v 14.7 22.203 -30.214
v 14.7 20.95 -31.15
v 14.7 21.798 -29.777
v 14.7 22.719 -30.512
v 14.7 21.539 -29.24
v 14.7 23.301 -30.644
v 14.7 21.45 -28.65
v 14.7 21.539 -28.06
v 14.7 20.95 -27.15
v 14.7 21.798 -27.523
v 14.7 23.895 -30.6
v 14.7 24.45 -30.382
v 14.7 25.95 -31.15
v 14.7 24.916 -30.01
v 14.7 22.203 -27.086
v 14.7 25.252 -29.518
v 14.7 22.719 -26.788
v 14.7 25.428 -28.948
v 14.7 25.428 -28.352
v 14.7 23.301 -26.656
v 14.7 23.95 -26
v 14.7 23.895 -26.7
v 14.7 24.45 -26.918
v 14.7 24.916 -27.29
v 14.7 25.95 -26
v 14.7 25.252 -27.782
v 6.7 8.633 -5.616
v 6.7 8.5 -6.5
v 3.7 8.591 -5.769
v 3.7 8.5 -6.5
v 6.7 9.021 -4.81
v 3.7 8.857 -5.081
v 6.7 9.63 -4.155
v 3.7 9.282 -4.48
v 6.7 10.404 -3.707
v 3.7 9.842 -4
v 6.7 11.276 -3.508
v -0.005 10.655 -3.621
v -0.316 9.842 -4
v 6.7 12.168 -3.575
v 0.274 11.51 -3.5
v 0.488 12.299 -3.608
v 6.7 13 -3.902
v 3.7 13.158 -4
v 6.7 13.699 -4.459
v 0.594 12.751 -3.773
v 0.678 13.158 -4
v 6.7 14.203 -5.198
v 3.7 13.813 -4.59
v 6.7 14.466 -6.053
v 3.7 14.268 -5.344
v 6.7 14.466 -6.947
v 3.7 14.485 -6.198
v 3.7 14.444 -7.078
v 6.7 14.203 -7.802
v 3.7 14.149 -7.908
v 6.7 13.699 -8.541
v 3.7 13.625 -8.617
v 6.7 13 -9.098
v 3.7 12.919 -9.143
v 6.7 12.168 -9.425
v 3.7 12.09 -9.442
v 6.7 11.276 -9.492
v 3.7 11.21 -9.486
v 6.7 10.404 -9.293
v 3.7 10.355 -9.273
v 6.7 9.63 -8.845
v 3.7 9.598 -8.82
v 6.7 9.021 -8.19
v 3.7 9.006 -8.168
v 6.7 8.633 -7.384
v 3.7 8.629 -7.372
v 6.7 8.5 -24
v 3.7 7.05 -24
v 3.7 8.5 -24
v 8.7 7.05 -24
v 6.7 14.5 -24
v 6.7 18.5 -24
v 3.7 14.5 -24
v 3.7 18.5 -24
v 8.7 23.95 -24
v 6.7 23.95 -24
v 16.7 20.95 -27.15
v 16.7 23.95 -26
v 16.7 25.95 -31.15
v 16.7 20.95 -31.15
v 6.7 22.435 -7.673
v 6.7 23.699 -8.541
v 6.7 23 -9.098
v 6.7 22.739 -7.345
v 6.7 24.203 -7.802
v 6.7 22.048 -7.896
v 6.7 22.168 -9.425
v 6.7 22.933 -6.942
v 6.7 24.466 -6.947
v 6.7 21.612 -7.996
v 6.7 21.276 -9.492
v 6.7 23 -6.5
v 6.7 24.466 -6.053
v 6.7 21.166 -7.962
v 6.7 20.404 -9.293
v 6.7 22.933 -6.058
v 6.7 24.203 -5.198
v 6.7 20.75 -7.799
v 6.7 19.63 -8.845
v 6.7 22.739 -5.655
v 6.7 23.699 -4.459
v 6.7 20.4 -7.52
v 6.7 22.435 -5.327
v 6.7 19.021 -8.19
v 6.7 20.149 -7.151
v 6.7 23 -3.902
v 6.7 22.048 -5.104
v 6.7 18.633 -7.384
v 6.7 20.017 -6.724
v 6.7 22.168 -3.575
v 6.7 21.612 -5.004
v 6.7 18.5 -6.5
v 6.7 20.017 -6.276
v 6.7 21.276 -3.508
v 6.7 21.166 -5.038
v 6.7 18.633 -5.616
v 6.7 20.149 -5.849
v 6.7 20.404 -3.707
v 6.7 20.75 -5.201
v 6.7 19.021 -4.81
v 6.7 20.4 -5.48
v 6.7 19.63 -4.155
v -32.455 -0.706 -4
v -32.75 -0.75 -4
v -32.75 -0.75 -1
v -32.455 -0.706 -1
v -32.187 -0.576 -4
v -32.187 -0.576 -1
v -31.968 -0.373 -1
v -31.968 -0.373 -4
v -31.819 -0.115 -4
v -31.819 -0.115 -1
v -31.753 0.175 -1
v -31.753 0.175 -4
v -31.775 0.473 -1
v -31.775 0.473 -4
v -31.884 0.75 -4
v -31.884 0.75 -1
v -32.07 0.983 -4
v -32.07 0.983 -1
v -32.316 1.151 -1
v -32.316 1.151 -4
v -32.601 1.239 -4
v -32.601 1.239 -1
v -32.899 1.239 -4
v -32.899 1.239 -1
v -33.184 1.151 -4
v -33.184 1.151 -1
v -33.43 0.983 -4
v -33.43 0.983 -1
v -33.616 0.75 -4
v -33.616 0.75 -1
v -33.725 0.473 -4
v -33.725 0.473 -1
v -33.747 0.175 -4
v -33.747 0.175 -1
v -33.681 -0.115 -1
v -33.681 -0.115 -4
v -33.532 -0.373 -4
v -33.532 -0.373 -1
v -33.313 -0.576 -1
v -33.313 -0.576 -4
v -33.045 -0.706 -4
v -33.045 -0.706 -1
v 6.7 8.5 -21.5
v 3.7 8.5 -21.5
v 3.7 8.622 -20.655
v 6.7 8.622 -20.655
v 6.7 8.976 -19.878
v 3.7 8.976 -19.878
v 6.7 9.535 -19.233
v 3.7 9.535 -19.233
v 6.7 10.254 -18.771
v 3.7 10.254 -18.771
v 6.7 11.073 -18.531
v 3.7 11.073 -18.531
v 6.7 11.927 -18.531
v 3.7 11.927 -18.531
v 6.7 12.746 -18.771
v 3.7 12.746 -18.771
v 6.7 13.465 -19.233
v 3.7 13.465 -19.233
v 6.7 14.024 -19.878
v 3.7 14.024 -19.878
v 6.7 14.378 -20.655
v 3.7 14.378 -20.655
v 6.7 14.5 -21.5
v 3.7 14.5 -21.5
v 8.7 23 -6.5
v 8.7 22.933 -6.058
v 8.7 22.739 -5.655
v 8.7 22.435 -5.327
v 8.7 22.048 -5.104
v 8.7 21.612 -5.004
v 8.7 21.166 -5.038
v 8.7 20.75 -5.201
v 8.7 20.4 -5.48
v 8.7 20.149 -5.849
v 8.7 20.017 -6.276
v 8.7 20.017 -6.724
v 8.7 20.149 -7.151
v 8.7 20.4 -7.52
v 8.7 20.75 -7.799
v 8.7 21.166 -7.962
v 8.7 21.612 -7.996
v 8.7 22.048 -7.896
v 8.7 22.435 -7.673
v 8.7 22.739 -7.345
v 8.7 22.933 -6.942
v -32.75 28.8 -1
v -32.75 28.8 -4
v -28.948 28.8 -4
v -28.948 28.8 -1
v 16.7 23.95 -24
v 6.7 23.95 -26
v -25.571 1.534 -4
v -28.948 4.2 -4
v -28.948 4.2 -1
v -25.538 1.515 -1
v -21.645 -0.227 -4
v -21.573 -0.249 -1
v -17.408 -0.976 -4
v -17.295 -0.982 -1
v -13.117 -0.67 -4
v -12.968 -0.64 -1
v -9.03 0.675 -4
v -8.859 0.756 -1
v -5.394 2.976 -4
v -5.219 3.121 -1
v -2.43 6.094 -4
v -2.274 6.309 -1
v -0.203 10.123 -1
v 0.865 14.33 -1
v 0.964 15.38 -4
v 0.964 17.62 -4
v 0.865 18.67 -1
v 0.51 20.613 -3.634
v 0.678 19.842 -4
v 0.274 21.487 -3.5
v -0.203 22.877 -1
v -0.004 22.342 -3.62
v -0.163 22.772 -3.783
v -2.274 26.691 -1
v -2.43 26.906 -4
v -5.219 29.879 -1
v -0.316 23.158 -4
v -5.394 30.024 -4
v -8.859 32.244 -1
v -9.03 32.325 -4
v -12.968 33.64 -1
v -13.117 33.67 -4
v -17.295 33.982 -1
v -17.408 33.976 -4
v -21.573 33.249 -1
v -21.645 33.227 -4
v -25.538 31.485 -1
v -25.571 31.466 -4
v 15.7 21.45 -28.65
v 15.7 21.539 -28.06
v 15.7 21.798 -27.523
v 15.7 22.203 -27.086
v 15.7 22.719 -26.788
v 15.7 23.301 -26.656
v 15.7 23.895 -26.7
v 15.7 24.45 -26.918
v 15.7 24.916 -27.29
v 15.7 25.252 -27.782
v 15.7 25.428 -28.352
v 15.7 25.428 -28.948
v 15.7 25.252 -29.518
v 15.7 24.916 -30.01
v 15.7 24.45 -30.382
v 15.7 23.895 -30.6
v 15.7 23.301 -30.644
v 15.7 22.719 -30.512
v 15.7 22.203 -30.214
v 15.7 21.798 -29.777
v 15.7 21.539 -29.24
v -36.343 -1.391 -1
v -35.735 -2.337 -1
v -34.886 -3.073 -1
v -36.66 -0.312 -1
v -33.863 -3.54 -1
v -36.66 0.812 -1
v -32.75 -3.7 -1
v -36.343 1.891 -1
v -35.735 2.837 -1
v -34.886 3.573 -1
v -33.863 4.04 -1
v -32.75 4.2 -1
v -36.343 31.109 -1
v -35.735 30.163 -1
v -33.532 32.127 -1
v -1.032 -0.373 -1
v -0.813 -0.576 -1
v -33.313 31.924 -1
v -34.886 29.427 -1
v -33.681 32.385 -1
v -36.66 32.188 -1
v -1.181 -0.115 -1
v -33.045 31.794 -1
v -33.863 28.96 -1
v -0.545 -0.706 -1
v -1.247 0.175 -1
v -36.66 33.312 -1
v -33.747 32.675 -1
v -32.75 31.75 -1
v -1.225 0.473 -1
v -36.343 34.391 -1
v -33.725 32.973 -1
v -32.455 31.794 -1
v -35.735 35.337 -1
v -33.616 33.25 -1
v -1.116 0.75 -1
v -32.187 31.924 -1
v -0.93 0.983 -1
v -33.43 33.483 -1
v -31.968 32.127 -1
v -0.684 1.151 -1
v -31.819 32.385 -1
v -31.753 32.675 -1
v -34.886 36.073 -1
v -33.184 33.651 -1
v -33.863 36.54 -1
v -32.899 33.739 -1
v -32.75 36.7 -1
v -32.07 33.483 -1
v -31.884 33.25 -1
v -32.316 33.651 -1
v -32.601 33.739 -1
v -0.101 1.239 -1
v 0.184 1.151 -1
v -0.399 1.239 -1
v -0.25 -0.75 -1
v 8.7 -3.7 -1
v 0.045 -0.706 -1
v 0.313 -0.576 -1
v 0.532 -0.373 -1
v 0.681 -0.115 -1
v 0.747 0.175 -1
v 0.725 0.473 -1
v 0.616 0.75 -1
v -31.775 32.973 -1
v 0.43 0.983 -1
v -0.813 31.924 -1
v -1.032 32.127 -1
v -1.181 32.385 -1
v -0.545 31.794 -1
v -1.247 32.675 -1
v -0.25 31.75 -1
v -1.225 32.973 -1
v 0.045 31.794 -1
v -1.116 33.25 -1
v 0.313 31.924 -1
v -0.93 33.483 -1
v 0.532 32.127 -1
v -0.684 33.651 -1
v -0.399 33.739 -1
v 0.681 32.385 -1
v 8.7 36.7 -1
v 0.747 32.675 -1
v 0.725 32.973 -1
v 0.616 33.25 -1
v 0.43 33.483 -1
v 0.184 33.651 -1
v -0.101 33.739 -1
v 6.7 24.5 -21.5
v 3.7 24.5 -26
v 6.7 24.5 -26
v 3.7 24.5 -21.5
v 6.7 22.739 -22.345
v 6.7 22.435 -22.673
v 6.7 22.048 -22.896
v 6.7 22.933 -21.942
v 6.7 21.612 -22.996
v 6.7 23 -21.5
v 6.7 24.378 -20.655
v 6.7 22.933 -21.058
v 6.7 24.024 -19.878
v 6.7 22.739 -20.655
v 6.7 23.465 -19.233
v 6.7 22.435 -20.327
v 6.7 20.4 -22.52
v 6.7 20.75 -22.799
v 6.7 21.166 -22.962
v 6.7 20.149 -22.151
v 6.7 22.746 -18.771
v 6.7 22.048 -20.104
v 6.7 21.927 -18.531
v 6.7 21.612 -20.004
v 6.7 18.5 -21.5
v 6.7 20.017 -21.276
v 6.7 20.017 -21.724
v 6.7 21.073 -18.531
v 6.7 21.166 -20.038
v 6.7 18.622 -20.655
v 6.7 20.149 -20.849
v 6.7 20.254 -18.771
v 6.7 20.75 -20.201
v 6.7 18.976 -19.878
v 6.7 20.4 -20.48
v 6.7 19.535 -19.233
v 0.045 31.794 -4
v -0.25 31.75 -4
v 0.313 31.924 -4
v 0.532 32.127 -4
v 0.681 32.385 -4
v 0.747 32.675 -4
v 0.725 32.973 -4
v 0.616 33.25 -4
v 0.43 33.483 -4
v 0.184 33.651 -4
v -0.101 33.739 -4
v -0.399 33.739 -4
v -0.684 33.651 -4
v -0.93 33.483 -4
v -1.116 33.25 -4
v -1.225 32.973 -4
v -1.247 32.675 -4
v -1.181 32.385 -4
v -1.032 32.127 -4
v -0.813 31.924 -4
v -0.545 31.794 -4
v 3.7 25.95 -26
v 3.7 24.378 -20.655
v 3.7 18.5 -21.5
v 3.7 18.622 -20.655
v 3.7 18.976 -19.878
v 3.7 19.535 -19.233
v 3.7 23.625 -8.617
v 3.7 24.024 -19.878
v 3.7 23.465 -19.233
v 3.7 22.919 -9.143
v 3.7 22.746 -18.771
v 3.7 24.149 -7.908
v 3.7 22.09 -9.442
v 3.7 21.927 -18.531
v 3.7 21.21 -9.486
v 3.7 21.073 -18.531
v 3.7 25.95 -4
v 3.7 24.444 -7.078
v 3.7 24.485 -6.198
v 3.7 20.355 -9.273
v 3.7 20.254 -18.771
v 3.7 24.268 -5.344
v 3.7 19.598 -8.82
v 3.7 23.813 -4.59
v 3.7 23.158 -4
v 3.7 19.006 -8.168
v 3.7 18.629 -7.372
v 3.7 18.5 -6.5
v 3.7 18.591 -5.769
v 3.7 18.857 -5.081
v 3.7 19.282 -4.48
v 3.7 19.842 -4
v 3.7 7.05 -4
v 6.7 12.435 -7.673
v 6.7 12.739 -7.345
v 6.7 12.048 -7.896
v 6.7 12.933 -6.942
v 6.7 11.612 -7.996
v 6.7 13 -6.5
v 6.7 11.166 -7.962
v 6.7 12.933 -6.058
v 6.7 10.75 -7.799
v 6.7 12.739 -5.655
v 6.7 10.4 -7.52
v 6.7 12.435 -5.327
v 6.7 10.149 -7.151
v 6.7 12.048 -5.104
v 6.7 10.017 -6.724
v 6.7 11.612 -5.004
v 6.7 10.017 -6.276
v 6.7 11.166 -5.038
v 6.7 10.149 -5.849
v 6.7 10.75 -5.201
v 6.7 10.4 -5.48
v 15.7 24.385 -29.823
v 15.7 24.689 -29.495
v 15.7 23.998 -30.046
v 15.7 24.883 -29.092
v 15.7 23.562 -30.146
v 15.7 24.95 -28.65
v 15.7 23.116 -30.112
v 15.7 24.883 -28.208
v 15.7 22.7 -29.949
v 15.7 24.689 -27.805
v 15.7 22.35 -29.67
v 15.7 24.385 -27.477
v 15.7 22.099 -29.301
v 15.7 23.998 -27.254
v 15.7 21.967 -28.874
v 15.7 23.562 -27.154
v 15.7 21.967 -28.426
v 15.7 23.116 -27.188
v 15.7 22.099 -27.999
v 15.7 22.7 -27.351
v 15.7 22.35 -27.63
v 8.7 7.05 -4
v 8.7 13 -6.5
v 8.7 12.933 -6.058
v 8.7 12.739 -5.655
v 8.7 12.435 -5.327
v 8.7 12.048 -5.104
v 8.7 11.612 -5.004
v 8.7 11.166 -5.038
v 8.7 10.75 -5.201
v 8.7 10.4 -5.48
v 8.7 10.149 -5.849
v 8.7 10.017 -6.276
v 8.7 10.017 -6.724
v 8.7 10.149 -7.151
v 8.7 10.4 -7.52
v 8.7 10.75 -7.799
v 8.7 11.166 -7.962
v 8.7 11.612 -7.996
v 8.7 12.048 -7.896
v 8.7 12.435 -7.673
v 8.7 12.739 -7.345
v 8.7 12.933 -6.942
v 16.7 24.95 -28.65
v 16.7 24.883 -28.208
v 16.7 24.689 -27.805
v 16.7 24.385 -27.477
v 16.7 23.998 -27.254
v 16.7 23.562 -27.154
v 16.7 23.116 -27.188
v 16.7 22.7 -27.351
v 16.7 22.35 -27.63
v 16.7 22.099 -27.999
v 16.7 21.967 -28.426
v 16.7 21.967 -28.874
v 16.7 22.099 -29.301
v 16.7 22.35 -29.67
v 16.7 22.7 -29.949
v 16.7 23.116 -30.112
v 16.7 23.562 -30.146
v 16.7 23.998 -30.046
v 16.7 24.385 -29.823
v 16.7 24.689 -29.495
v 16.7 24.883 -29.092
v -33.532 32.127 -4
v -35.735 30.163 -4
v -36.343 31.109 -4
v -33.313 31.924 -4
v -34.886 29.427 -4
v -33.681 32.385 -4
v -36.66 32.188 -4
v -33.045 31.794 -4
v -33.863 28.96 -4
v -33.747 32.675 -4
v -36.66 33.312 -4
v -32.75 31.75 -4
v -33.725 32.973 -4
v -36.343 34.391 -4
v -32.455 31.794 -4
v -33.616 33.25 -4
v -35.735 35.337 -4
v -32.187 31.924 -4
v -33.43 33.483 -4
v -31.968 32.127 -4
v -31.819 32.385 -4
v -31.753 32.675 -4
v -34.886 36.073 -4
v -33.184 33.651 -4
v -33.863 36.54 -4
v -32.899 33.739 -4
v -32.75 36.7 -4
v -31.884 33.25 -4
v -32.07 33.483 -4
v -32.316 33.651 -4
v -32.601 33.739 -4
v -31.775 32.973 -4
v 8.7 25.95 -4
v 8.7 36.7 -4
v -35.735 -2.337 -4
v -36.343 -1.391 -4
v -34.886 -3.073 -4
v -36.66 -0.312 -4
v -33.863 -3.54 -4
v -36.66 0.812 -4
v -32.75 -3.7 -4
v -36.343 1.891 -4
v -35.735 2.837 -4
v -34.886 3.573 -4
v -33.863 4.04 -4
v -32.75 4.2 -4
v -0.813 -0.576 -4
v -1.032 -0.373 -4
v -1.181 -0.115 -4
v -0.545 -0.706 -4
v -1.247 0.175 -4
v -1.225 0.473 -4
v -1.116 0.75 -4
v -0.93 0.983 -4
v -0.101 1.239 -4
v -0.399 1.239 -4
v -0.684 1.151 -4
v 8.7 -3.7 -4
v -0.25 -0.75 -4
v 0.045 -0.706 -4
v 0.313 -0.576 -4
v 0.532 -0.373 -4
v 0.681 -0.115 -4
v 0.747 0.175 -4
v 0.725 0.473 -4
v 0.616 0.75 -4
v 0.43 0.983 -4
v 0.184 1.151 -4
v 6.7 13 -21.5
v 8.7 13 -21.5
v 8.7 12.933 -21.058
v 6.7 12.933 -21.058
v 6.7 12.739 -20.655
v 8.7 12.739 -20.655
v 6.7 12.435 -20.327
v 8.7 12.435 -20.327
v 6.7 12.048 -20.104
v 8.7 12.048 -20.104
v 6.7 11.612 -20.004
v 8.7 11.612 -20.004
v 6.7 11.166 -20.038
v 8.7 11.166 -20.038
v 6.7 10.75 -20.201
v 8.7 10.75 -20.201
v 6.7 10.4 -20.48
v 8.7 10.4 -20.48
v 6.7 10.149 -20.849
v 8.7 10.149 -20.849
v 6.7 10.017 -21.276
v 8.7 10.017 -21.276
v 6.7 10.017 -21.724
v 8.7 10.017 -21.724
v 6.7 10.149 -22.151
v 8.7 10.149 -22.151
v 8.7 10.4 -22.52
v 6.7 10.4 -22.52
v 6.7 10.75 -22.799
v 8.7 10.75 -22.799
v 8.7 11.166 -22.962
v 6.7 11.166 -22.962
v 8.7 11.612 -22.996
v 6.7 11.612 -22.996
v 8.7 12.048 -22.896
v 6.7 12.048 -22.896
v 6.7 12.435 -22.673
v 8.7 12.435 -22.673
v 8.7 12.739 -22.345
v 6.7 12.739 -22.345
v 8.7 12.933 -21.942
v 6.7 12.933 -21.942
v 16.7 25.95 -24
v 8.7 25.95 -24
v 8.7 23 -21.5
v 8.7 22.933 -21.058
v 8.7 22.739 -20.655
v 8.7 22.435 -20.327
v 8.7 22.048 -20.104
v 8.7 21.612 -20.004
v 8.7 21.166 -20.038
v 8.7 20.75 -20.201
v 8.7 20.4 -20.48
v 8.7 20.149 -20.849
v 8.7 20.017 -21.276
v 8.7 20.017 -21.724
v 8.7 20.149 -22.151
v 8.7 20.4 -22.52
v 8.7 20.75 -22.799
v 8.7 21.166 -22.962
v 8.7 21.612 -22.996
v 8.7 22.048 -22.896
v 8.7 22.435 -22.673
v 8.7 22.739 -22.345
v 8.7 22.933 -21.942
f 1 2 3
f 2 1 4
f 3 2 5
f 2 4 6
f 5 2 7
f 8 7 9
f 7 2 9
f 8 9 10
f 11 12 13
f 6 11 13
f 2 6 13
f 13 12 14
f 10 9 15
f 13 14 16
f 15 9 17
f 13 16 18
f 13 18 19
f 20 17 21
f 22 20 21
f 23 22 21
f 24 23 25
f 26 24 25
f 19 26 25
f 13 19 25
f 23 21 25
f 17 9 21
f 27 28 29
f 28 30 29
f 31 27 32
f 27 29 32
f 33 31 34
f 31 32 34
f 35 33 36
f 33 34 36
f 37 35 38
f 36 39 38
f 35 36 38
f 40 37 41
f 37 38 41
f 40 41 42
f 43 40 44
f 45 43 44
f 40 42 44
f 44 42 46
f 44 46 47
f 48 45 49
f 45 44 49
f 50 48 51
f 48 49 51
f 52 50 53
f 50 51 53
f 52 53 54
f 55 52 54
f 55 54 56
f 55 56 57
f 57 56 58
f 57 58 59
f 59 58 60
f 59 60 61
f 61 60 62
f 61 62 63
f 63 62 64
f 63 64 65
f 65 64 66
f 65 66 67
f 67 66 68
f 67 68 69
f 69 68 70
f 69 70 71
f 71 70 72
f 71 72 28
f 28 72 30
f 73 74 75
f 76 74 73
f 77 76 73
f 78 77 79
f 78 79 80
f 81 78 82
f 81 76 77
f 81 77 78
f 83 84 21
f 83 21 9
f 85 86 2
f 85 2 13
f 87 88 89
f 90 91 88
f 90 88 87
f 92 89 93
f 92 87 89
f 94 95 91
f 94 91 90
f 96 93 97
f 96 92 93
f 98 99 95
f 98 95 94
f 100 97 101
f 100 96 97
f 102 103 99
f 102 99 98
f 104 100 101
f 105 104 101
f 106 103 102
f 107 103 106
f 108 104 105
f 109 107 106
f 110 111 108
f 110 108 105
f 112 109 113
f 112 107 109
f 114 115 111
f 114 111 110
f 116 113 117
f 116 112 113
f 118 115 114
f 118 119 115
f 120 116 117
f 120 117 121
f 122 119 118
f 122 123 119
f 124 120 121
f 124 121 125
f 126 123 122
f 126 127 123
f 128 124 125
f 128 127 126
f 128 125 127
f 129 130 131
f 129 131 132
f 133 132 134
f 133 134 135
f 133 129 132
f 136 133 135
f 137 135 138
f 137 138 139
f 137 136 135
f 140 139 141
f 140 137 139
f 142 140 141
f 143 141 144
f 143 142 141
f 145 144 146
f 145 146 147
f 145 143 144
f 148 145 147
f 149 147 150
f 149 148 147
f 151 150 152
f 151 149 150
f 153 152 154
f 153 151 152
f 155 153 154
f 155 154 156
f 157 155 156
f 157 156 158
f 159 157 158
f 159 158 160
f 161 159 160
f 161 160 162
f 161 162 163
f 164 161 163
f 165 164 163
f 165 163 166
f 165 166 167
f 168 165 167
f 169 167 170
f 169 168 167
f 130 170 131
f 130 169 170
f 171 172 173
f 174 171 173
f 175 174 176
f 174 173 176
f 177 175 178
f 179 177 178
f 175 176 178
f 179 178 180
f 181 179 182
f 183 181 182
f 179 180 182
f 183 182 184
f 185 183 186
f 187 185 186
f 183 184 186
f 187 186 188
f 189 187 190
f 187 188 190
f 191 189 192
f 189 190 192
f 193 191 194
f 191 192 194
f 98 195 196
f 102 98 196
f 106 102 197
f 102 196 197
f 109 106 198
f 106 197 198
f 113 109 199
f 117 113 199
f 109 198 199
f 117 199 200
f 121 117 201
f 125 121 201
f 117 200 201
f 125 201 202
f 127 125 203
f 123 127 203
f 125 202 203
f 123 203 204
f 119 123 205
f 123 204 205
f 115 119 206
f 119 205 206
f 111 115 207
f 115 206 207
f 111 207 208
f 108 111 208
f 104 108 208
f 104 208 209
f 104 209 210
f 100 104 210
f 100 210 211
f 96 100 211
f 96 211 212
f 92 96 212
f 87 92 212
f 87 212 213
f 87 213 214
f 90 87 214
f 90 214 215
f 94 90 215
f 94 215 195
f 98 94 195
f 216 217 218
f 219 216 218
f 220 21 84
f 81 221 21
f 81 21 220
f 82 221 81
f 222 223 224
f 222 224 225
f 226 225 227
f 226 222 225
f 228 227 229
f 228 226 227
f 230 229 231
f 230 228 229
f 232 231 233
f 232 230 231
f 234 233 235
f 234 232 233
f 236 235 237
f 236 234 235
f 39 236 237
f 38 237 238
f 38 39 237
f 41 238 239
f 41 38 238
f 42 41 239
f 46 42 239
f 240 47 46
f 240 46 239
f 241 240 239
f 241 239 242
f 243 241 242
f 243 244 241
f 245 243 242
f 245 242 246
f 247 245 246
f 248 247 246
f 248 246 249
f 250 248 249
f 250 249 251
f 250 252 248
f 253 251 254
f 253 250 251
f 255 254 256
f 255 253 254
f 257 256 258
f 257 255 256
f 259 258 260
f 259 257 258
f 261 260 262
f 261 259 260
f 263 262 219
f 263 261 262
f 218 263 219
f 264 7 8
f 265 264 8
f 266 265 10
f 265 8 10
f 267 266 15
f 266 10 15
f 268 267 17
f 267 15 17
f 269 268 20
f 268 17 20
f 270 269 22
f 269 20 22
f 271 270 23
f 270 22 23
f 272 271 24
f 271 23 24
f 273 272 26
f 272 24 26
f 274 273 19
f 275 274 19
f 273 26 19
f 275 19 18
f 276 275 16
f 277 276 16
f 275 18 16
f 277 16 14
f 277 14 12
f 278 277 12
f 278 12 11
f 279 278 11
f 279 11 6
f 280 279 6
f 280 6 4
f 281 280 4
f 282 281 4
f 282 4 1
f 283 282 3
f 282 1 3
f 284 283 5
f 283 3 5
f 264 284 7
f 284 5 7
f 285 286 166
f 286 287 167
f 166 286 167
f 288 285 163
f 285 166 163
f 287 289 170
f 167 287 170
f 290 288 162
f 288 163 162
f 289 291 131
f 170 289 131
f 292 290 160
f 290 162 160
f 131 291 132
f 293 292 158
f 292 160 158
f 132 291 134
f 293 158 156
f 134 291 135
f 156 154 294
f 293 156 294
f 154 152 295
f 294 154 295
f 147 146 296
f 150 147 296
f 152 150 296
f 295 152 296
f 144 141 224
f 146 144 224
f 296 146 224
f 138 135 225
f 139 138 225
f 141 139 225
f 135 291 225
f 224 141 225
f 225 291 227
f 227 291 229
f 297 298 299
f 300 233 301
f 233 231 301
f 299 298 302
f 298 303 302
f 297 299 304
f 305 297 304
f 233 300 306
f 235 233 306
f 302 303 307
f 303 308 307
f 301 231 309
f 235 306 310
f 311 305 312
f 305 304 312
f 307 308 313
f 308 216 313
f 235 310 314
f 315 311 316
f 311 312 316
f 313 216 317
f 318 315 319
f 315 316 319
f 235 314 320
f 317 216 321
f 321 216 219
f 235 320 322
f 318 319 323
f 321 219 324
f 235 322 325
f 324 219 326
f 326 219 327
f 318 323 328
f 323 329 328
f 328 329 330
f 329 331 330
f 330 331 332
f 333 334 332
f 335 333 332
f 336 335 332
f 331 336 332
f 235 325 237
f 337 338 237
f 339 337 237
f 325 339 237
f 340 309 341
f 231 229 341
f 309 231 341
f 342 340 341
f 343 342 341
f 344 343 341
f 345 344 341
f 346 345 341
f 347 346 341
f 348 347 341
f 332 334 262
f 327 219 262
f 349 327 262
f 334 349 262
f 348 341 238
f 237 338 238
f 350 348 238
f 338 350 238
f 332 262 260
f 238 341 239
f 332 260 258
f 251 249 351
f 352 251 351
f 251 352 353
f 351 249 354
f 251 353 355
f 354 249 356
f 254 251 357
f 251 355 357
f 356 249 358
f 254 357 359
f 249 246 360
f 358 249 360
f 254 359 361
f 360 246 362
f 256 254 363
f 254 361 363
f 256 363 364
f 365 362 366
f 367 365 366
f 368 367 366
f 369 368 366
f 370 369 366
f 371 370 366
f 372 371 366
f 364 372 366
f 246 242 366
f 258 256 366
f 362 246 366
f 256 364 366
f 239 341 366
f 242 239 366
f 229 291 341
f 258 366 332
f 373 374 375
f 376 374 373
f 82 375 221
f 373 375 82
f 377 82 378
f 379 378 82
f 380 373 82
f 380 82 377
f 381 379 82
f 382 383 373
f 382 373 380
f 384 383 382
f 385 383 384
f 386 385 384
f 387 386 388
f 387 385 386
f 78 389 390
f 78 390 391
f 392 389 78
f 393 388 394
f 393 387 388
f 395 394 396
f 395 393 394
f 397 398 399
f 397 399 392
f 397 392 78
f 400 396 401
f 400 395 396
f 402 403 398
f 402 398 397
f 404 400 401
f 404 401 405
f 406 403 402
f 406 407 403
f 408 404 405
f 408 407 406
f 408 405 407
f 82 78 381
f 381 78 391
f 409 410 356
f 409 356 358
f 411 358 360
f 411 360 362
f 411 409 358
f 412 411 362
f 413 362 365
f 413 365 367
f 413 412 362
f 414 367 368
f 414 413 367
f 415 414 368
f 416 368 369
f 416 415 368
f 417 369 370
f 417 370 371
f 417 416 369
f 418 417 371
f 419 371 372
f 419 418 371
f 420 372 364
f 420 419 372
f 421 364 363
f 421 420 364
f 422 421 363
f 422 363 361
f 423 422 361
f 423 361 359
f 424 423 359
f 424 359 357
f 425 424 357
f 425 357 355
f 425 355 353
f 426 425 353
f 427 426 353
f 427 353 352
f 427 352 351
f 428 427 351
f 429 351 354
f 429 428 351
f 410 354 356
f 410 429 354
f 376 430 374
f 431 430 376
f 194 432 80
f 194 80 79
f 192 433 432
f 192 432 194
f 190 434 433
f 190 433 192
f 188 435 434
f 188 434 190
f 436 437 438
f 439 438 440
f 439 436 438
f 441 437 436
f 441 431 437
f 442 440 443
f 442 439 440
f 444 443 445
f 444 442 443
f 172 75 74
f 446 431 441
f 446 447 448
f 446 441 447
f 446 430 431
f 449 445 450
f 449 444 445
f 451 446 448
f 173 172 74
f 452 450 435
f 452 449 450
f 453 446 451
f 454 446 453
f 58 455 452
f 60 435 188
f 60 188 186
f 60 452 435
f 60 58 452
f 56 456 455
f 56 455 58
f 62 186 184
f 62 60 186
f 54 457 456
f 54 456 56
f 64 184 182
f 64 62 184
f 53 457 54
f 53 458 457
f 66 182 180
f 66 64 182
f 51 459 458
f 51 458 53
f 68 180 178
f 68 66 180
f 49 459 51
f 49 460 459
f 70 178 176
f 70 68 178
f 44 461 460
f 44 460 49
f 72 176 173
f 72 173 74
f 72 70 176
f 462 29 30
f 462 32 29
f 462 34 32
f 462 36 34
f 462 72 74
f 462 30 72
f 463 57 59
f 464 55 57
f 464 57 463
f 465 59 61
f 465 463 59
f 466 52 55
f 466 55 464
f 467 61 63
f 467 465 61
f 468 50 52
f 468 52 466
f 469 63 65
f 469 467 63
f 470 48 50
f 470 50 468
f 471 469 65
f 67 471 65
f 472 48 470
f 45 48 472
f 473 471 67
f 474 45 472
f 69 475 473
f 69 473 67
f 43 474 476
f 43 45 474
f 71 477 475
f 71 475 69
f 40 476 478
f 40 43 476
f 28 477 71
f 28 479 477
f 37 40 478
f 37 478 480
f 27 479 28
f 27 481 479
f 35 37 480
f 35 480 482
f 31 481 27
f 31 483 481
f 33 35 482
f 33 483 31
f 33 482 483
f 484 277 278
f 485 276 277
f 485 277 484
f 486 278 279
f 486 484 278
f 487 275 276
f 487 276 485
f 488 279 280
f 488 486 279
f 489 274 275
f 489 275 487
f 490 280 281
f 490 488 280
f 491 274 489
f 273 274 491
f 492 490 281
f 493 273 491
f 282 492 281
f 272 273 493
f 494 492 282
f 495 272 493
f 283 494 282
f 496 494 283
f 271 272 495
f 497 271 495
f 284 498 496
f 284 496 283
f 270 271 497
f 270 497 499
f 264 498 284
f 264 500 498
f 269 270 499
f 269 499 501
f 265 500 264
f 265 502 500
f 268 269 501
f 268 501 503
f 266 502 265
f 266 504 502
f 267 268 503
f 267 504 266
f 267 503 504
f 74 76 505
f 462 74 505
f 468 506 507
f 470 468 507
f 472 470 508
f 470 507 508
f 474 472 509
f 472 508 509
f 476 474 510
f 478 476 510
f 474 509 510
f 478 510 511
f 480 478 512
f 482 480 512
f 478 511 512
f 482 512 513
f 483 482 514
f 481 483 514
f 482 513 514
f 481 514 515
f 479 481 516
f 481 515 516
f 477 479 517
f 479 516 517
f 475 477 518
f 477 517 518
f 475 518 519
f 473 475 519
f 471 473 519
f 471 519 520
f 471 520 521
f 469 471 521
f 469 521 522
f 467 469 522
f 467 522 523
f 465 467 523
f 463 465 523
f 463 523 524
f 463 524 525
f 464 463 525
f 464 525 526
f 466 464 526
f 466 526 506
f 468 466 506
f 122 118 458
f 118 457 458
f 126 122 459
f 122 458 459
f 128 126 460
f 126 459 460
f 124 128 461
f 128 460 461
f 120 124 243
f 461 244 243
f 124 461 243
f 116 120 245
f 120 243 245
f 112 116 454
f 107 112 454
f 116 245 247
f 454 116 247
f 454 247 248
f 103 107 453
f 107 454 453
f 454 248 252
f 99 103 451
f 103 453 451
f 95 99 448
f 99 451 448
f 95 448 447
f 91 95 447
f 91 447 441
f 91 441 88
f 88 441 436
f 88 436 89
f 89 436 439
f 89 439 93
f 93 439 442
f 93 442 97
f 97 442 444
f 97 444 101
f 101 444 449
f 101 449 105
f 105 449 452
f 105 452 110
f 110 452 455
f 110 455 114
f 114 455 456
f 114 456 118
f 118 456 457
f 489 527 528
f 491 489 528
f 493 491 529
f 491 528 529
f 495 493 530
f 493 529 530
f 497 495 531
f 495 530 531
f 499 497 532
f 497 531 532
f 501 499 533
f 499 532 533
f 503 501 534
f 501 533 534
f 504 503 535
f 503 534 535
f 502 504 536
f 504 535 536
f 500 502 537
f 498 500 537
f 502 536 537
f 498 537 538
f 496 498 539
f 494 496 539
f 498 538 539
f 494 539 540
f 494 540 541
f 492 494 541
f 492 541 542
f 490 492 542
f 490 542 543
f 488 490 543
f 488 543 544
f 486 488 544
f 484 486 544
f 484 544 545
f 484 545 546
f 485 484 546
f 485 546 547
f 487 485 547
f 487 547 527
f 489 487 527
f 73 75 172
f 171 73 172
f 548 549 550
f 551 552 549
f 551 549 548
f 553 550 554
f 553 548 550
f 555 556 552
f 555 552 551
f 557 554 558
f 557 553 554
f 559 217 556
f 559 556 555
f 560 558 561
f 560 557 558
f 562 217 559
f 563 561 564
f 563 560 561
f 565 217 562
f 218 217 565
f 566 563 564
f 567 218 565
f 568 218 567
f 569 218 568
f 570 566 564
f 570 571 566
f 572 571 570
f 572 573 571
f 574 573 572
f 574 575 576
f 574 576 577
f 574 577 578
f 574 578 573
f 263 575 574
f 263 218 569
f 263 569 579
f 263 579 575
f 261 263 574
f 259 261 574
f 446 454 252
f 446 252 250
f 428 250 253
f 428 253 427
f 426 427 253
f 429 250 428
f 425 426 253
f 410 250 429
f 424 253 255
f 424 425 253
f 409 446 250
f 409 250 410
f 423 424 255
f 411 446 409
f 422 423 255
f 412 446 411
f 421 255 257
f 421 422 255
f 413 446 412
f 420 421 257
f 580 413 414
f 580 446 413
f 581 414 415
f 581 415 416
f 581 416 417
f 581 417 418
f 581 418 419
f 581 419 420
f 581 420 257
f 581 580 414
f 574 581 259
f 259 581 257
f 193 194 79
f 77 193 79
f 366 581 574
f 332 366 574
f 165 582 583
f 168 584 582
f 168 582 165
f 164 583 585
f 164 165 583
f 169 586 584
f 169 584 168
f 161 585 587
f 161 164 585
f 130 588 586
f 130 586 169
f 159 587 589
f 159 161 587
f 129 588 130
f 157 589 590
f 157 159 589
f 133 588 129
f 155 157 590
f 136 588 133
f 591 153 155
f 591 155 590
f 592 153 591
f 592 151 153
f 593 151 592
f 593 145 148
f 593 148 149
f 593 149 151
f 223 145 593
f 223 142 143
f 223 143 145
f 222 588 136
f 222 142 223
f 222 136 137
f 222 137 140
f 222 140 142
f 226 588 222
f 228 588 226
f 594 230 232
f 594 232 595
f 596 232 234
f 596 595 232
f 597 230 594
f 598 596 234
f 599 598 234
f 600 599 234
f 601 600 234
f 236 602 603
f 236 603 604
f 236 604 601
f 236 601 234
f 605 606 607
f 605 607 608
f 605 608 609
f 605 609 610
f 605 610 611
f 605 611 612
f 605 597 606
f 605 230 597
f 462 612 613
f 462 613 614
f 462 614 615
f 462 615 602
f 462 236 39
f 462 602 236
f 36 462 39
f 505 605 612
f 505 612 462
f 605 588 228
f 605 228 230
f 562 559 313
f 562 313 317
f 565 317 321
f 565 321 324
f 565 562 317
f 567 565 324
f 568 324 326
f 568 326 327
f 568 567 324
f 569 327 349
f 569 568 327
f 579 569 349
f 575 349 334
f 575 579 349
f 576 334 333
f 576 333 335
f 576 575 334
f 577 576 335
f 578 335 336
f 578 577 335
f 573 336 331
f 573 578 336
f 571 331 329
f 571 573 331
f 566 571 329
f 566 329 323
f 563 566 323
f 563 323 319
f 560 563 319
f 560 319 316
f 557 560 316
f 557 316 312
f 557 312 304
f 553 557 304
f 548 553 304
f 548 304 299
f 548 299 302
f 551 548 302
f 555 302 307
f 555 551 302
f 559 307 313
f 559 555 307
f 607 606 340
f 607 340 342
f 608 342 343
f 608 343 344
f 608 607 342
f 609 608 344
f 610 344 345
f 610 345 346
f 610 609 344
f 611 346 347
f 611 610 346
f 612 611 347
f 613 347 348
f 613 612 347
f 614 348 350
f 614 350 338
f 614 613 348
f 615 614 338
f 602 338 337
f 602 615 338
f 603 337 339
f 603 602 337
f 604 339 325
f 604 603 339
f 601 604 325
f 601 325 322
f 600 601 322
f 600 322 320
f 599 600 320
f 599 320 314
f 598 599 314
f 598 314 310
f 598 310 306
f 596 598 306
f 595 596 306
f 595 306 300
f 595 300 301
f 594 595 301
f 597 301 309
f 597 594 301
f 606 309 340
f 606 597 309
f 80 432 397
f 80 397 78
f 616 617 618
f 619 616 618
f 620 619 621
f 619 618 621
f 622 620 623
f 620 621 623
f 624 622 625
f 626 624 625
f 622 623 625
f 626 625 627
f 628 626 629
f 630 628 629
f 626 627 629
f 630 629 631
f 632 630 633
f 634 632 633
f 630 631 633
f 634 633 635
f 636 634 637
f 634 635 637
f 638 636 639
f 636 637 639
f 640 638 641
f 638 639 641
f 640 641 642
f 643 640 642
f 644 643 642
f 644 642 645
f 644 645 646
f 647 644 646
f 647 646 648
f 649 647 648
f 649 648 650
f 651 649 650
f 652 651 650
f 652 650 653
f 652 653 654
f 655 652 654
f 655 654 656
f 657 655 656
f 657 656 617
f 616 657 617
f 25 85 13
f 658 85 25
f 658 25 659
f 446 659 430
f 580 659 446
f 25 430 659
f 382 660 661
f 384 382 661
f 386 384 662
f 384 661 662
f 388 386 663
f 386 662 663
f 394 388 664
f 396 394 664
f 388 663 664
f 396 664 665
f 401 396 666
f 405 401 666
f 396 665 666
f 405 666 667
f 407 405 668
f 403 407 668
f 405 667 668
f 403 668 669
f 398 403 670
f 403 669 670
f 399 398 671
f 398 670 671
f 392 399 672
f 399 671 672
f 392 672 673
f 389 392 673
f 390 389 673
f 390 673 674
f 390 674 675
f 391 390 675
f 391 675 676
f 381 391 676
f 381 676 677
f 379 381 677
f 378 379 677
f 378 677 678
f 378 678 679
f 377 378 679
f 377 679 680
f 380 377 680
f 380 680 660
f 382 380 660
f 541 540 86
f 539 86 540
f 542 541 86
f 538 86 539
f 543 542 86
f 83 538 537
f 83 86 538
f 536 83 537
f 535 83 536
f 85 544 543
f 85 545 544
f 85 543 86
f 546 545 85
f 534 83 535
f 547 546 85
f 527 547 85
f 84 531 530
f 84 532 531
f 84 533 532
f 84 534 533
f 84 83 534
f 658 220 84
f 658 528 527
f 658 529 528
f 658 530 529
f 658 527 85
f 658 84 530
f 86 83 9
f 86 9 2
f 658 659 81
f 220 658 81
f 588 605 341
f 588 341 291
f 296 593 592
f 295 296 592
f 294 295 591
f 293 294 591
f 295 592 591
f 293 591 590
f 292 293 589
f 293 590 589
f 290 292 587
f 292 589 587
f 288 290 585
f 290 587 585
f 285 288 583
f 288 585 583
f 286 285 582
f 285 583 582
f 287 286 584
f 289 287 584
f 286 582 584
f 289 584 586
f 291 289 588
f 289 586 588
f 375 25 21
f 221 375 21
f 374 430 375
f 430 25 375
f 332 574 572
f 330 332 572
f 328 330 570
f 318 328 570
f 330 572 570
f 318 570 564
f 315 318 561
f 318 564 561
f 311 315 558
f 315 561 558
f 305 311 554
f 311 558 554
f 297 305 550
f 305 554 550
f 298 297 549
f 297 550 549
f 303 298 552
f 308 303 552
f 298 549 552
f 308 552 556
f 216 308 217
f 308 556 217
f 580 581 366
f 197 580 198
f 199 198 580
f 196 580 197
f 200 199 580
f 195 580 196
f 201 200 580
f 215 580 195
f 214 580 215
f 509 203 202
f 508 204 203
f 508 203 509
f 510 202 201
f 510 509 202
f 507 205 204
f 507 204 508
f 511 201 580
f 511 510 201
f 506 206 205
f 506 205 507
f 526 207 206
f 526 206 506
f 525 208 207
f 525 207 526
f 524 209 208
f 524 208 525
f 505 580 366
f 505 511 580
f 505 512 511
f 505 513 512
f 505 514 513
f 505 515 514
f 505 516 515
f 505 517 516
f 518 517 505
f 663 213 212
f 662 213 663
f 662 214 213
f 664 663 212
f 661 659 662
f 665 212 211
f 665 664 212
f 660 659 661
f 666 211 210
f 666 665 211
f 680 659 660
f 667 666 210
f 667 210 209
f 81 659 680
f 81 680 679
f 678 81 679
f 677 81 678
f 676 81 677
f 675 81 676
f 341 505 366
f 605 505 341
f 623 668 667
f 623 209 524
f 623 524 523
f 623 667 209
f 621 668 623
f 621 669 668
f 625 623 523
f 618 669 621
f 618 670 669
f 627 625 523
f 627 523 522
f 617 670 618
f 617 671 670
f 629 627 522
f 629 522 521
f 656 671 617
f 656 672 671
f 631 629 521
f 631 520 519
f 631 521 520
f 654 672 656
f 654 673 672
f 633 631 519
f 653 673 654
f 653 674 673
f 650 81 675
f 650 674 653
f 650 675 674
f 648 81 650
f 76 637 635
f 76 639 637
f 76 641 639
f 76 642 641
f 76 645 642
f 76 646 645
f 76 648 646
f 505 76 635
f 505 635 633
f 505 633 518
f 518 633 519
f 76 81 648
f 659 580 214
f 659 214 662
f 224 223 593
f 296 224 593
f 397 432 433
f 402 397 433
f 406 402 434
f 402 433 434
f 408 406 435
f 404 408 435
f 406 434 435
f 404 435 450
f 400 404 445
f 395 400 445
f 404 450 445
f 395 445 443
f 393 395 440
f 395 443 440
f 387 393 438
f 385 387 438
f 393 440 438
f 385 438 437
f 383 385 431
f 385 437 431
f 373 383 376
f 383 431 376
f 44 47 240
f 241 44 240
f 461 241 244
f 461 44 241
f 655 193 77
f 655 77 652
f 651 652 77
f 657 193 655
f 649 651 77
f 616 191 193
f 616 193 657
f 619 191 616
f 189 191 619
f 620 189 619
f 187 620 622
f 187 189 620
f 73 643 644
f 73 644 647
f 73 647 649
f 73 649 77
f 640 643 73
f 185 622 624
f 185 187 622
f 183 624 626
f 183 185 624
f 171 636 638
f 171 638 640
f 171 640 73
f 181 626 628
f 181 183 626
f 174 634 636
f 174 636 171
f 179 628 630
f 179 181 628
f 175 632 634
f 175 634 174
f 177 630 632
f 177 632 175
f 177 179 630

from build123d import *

# Parameters (mm, degrees)
SKETCH_R             = 1
PAD_DEPTH            = 3
SKETCH001_W          = 18.9
SKETCH001_H          = 20
SKETCH001_R          = 1.5
PAD001_DEPTH         = 5
SKETCH002_W          = 2
SKETCH002_H          = 2
PAD002_DEPTH         = 13
SKETCH003_R          = 1.5
PAD003_DEPTH         = 2
SKETCH004_R          = 2
POCKET_DEPTH         = 1
SKETCH005_R          = 3
POCKET001_DEPTH      = 3
POCKET001_DEPTH_BACK = -5


with BuildPart() as part:
    # Sketch (on Face5 of Binder001) → Pad (new body)
    with BuildSketch(Plane(origin=(-16.5, 16.5, 0), x_dir=(0, -1, 0), z_dir=(0, 0, 1))):
        with BuildLine():
            Line((-20.2, 25.2), (20.2, 25.2))
            Line((20.2, 25.2), (20.2, 20.2))
            Line((20.2, 20.2), (20.2, -16.25))
            ThreePointArc((12.3, -16.25), (16.25, -20.2), (20.2, -16.25))
            Line((12.3, -12.448293), (12.3, -16.25))
            ThreePointArc((12.3, -12.448293), (0, 17.5), (-12.3, -12.448293))
            Line((-12.3, -16.25), (-12.3, -12.448293))
            ThreePointArc((-20.2, -16.25), (-16.25, -20.2), (-12.3, -16.25))
            Line((-20.2, 20.2), (-20.2, -16.25))
            Line((-20.2, 20.2), (-20.2, 25.2))
        make_face()
        with Locations((-16.25, 16.25)):
            Circle(SKETCH_R, mode=Mode.SUBTRACT)
        with Locations((16.25, 16.25)):
            Circle(SKETCH_R, mode=Mode.SUBTRACT)
        with Locations((16.25, -16.25)):
            Circle(SKETCH_R, mode=Mode.SUBTRACT)
        with Locations((-16.25, -16.25)):
            Circle(SKETCH_R, mode=Mode.SUBTRACT)
    extrude(amount=PAD_DEPTH)

    # Sketch001 (on Face4 of Pad) → Pad001 (join)
    with BuildSketch(Plane(origin=(8.7, 16.5, -29.5), x_dir=(0, 1, 0), z_dir=(1, 0, 0))):
        with Locations((0, 19.5)):
            Rectangle(SKETCH001_W, SKETCH001_H)
        with Locations((-5, 27)):
            Circle(SKETCH001_R, mode=Mode.SUBTRACT)
        with Locations((5, 27)):
            Circle(SKETCH001_R, mode=Mode.SUBTRACT)
        with Locations((-5, 12)):
            Circle(SKETCH001_R, mode=Mode.SUBTRACT)
        with Locations((5, 12)):
            Circle(SKETCH001_R, mode=Mode.SUBTRACT)
    extrude(amount=-PAD001_DEPTH)

    # Sketch002 (on Face10 of Pad001) → Pad002 (join)
    with BuildSketch(Plane(origin=(3.7, 16.5, -29.5), x_dir=(0, -1, 0), z_dir=(-1, 0, 0))):
        with Locations((-8.45, 8.5)):
            Rectangle(SKETCH002_W, SKETCH002_H)
    extrude(amount=-PAD002_DEPTH)

    # Sketch003 (on Face30 of Pad002) → Pad003 (join)
    with BuildSketch(Plane(origin=(16.7, 16.5, -29.5), x_dir=(0, 1, 0), z_dir=(1, 0, 0))):
        Polygon((4.45, 2.35), (9.45, 2.35), (9.45, 9.5), (7.45, 9.5), (7.45, 7.5), (4.45, 6.35), align=None)
        with Locations((6.95, 4.85)):
            Circle(SKETCH003_R, mode=Mode.SUBTRACT)
    extrude(amount=-PAD003_DEPTH)

    # Sketch004 (on Face35 of Pad003) → Pocket (cut)
    with BuildSketch(Plane(origin=(14.7, 16.5, -29.5), x_dir=(0, -1, 0), z_dir=(-1, 0, 0))):
        with Locations((-6.95, 4.85)):
            Circle(SKETCH004_R)
    extrude(amount=-POCKET_DEPTH, mode=Mode.SUBTRACT)

    # Sketch005 (on Face10 of Pocket) → Pocket001 (cut, two sides)
    with BuildSketch(Plane(origin=(3.7, 16.5, -29.5), x_dir=(0, -1, 0), z_dir=(-1, 0, 0))) as pocket001_sk:
        with Locations((-5, 27)):
            Circle(SKETCH005_R)
        with Locations((5, 27)):
            Circle(SKETCH005_R)
        with BuildLine():
            ThreePointArc((-2, 12.000001), (-5, 15), (-8, 12.000001))
            Line((-8, 7.5), (-8, 12.000001))
            Line((-2, 7.5), (-8, 7.5))
            Line((-2, 12.000001), (-2, 7.5))
        make_face()
        with BuildLine():
            ThreePointArc((8, 11.999976), (5, 15), (2, 11.999976))
            Line((2, 11.999976), (2, 9.5))
            Line((2, 9.5), (8, 9.5))
            Line((8, 9.5), (8, 11.999976))
        make_face()
    extrude(amount=-POCKET001_DEPTH, mode=Mode.SUBTRACT)
    extrude(pocket001_sk.sketch, amount=-POCKET001_DEPTH_BACK, mode=Mode.SUBTRACT)


with BuildPart() as part_1:
    # Body placement: moved
    add(part.part.moved(Location((0, 0, -4))))


solid = part_1.part
